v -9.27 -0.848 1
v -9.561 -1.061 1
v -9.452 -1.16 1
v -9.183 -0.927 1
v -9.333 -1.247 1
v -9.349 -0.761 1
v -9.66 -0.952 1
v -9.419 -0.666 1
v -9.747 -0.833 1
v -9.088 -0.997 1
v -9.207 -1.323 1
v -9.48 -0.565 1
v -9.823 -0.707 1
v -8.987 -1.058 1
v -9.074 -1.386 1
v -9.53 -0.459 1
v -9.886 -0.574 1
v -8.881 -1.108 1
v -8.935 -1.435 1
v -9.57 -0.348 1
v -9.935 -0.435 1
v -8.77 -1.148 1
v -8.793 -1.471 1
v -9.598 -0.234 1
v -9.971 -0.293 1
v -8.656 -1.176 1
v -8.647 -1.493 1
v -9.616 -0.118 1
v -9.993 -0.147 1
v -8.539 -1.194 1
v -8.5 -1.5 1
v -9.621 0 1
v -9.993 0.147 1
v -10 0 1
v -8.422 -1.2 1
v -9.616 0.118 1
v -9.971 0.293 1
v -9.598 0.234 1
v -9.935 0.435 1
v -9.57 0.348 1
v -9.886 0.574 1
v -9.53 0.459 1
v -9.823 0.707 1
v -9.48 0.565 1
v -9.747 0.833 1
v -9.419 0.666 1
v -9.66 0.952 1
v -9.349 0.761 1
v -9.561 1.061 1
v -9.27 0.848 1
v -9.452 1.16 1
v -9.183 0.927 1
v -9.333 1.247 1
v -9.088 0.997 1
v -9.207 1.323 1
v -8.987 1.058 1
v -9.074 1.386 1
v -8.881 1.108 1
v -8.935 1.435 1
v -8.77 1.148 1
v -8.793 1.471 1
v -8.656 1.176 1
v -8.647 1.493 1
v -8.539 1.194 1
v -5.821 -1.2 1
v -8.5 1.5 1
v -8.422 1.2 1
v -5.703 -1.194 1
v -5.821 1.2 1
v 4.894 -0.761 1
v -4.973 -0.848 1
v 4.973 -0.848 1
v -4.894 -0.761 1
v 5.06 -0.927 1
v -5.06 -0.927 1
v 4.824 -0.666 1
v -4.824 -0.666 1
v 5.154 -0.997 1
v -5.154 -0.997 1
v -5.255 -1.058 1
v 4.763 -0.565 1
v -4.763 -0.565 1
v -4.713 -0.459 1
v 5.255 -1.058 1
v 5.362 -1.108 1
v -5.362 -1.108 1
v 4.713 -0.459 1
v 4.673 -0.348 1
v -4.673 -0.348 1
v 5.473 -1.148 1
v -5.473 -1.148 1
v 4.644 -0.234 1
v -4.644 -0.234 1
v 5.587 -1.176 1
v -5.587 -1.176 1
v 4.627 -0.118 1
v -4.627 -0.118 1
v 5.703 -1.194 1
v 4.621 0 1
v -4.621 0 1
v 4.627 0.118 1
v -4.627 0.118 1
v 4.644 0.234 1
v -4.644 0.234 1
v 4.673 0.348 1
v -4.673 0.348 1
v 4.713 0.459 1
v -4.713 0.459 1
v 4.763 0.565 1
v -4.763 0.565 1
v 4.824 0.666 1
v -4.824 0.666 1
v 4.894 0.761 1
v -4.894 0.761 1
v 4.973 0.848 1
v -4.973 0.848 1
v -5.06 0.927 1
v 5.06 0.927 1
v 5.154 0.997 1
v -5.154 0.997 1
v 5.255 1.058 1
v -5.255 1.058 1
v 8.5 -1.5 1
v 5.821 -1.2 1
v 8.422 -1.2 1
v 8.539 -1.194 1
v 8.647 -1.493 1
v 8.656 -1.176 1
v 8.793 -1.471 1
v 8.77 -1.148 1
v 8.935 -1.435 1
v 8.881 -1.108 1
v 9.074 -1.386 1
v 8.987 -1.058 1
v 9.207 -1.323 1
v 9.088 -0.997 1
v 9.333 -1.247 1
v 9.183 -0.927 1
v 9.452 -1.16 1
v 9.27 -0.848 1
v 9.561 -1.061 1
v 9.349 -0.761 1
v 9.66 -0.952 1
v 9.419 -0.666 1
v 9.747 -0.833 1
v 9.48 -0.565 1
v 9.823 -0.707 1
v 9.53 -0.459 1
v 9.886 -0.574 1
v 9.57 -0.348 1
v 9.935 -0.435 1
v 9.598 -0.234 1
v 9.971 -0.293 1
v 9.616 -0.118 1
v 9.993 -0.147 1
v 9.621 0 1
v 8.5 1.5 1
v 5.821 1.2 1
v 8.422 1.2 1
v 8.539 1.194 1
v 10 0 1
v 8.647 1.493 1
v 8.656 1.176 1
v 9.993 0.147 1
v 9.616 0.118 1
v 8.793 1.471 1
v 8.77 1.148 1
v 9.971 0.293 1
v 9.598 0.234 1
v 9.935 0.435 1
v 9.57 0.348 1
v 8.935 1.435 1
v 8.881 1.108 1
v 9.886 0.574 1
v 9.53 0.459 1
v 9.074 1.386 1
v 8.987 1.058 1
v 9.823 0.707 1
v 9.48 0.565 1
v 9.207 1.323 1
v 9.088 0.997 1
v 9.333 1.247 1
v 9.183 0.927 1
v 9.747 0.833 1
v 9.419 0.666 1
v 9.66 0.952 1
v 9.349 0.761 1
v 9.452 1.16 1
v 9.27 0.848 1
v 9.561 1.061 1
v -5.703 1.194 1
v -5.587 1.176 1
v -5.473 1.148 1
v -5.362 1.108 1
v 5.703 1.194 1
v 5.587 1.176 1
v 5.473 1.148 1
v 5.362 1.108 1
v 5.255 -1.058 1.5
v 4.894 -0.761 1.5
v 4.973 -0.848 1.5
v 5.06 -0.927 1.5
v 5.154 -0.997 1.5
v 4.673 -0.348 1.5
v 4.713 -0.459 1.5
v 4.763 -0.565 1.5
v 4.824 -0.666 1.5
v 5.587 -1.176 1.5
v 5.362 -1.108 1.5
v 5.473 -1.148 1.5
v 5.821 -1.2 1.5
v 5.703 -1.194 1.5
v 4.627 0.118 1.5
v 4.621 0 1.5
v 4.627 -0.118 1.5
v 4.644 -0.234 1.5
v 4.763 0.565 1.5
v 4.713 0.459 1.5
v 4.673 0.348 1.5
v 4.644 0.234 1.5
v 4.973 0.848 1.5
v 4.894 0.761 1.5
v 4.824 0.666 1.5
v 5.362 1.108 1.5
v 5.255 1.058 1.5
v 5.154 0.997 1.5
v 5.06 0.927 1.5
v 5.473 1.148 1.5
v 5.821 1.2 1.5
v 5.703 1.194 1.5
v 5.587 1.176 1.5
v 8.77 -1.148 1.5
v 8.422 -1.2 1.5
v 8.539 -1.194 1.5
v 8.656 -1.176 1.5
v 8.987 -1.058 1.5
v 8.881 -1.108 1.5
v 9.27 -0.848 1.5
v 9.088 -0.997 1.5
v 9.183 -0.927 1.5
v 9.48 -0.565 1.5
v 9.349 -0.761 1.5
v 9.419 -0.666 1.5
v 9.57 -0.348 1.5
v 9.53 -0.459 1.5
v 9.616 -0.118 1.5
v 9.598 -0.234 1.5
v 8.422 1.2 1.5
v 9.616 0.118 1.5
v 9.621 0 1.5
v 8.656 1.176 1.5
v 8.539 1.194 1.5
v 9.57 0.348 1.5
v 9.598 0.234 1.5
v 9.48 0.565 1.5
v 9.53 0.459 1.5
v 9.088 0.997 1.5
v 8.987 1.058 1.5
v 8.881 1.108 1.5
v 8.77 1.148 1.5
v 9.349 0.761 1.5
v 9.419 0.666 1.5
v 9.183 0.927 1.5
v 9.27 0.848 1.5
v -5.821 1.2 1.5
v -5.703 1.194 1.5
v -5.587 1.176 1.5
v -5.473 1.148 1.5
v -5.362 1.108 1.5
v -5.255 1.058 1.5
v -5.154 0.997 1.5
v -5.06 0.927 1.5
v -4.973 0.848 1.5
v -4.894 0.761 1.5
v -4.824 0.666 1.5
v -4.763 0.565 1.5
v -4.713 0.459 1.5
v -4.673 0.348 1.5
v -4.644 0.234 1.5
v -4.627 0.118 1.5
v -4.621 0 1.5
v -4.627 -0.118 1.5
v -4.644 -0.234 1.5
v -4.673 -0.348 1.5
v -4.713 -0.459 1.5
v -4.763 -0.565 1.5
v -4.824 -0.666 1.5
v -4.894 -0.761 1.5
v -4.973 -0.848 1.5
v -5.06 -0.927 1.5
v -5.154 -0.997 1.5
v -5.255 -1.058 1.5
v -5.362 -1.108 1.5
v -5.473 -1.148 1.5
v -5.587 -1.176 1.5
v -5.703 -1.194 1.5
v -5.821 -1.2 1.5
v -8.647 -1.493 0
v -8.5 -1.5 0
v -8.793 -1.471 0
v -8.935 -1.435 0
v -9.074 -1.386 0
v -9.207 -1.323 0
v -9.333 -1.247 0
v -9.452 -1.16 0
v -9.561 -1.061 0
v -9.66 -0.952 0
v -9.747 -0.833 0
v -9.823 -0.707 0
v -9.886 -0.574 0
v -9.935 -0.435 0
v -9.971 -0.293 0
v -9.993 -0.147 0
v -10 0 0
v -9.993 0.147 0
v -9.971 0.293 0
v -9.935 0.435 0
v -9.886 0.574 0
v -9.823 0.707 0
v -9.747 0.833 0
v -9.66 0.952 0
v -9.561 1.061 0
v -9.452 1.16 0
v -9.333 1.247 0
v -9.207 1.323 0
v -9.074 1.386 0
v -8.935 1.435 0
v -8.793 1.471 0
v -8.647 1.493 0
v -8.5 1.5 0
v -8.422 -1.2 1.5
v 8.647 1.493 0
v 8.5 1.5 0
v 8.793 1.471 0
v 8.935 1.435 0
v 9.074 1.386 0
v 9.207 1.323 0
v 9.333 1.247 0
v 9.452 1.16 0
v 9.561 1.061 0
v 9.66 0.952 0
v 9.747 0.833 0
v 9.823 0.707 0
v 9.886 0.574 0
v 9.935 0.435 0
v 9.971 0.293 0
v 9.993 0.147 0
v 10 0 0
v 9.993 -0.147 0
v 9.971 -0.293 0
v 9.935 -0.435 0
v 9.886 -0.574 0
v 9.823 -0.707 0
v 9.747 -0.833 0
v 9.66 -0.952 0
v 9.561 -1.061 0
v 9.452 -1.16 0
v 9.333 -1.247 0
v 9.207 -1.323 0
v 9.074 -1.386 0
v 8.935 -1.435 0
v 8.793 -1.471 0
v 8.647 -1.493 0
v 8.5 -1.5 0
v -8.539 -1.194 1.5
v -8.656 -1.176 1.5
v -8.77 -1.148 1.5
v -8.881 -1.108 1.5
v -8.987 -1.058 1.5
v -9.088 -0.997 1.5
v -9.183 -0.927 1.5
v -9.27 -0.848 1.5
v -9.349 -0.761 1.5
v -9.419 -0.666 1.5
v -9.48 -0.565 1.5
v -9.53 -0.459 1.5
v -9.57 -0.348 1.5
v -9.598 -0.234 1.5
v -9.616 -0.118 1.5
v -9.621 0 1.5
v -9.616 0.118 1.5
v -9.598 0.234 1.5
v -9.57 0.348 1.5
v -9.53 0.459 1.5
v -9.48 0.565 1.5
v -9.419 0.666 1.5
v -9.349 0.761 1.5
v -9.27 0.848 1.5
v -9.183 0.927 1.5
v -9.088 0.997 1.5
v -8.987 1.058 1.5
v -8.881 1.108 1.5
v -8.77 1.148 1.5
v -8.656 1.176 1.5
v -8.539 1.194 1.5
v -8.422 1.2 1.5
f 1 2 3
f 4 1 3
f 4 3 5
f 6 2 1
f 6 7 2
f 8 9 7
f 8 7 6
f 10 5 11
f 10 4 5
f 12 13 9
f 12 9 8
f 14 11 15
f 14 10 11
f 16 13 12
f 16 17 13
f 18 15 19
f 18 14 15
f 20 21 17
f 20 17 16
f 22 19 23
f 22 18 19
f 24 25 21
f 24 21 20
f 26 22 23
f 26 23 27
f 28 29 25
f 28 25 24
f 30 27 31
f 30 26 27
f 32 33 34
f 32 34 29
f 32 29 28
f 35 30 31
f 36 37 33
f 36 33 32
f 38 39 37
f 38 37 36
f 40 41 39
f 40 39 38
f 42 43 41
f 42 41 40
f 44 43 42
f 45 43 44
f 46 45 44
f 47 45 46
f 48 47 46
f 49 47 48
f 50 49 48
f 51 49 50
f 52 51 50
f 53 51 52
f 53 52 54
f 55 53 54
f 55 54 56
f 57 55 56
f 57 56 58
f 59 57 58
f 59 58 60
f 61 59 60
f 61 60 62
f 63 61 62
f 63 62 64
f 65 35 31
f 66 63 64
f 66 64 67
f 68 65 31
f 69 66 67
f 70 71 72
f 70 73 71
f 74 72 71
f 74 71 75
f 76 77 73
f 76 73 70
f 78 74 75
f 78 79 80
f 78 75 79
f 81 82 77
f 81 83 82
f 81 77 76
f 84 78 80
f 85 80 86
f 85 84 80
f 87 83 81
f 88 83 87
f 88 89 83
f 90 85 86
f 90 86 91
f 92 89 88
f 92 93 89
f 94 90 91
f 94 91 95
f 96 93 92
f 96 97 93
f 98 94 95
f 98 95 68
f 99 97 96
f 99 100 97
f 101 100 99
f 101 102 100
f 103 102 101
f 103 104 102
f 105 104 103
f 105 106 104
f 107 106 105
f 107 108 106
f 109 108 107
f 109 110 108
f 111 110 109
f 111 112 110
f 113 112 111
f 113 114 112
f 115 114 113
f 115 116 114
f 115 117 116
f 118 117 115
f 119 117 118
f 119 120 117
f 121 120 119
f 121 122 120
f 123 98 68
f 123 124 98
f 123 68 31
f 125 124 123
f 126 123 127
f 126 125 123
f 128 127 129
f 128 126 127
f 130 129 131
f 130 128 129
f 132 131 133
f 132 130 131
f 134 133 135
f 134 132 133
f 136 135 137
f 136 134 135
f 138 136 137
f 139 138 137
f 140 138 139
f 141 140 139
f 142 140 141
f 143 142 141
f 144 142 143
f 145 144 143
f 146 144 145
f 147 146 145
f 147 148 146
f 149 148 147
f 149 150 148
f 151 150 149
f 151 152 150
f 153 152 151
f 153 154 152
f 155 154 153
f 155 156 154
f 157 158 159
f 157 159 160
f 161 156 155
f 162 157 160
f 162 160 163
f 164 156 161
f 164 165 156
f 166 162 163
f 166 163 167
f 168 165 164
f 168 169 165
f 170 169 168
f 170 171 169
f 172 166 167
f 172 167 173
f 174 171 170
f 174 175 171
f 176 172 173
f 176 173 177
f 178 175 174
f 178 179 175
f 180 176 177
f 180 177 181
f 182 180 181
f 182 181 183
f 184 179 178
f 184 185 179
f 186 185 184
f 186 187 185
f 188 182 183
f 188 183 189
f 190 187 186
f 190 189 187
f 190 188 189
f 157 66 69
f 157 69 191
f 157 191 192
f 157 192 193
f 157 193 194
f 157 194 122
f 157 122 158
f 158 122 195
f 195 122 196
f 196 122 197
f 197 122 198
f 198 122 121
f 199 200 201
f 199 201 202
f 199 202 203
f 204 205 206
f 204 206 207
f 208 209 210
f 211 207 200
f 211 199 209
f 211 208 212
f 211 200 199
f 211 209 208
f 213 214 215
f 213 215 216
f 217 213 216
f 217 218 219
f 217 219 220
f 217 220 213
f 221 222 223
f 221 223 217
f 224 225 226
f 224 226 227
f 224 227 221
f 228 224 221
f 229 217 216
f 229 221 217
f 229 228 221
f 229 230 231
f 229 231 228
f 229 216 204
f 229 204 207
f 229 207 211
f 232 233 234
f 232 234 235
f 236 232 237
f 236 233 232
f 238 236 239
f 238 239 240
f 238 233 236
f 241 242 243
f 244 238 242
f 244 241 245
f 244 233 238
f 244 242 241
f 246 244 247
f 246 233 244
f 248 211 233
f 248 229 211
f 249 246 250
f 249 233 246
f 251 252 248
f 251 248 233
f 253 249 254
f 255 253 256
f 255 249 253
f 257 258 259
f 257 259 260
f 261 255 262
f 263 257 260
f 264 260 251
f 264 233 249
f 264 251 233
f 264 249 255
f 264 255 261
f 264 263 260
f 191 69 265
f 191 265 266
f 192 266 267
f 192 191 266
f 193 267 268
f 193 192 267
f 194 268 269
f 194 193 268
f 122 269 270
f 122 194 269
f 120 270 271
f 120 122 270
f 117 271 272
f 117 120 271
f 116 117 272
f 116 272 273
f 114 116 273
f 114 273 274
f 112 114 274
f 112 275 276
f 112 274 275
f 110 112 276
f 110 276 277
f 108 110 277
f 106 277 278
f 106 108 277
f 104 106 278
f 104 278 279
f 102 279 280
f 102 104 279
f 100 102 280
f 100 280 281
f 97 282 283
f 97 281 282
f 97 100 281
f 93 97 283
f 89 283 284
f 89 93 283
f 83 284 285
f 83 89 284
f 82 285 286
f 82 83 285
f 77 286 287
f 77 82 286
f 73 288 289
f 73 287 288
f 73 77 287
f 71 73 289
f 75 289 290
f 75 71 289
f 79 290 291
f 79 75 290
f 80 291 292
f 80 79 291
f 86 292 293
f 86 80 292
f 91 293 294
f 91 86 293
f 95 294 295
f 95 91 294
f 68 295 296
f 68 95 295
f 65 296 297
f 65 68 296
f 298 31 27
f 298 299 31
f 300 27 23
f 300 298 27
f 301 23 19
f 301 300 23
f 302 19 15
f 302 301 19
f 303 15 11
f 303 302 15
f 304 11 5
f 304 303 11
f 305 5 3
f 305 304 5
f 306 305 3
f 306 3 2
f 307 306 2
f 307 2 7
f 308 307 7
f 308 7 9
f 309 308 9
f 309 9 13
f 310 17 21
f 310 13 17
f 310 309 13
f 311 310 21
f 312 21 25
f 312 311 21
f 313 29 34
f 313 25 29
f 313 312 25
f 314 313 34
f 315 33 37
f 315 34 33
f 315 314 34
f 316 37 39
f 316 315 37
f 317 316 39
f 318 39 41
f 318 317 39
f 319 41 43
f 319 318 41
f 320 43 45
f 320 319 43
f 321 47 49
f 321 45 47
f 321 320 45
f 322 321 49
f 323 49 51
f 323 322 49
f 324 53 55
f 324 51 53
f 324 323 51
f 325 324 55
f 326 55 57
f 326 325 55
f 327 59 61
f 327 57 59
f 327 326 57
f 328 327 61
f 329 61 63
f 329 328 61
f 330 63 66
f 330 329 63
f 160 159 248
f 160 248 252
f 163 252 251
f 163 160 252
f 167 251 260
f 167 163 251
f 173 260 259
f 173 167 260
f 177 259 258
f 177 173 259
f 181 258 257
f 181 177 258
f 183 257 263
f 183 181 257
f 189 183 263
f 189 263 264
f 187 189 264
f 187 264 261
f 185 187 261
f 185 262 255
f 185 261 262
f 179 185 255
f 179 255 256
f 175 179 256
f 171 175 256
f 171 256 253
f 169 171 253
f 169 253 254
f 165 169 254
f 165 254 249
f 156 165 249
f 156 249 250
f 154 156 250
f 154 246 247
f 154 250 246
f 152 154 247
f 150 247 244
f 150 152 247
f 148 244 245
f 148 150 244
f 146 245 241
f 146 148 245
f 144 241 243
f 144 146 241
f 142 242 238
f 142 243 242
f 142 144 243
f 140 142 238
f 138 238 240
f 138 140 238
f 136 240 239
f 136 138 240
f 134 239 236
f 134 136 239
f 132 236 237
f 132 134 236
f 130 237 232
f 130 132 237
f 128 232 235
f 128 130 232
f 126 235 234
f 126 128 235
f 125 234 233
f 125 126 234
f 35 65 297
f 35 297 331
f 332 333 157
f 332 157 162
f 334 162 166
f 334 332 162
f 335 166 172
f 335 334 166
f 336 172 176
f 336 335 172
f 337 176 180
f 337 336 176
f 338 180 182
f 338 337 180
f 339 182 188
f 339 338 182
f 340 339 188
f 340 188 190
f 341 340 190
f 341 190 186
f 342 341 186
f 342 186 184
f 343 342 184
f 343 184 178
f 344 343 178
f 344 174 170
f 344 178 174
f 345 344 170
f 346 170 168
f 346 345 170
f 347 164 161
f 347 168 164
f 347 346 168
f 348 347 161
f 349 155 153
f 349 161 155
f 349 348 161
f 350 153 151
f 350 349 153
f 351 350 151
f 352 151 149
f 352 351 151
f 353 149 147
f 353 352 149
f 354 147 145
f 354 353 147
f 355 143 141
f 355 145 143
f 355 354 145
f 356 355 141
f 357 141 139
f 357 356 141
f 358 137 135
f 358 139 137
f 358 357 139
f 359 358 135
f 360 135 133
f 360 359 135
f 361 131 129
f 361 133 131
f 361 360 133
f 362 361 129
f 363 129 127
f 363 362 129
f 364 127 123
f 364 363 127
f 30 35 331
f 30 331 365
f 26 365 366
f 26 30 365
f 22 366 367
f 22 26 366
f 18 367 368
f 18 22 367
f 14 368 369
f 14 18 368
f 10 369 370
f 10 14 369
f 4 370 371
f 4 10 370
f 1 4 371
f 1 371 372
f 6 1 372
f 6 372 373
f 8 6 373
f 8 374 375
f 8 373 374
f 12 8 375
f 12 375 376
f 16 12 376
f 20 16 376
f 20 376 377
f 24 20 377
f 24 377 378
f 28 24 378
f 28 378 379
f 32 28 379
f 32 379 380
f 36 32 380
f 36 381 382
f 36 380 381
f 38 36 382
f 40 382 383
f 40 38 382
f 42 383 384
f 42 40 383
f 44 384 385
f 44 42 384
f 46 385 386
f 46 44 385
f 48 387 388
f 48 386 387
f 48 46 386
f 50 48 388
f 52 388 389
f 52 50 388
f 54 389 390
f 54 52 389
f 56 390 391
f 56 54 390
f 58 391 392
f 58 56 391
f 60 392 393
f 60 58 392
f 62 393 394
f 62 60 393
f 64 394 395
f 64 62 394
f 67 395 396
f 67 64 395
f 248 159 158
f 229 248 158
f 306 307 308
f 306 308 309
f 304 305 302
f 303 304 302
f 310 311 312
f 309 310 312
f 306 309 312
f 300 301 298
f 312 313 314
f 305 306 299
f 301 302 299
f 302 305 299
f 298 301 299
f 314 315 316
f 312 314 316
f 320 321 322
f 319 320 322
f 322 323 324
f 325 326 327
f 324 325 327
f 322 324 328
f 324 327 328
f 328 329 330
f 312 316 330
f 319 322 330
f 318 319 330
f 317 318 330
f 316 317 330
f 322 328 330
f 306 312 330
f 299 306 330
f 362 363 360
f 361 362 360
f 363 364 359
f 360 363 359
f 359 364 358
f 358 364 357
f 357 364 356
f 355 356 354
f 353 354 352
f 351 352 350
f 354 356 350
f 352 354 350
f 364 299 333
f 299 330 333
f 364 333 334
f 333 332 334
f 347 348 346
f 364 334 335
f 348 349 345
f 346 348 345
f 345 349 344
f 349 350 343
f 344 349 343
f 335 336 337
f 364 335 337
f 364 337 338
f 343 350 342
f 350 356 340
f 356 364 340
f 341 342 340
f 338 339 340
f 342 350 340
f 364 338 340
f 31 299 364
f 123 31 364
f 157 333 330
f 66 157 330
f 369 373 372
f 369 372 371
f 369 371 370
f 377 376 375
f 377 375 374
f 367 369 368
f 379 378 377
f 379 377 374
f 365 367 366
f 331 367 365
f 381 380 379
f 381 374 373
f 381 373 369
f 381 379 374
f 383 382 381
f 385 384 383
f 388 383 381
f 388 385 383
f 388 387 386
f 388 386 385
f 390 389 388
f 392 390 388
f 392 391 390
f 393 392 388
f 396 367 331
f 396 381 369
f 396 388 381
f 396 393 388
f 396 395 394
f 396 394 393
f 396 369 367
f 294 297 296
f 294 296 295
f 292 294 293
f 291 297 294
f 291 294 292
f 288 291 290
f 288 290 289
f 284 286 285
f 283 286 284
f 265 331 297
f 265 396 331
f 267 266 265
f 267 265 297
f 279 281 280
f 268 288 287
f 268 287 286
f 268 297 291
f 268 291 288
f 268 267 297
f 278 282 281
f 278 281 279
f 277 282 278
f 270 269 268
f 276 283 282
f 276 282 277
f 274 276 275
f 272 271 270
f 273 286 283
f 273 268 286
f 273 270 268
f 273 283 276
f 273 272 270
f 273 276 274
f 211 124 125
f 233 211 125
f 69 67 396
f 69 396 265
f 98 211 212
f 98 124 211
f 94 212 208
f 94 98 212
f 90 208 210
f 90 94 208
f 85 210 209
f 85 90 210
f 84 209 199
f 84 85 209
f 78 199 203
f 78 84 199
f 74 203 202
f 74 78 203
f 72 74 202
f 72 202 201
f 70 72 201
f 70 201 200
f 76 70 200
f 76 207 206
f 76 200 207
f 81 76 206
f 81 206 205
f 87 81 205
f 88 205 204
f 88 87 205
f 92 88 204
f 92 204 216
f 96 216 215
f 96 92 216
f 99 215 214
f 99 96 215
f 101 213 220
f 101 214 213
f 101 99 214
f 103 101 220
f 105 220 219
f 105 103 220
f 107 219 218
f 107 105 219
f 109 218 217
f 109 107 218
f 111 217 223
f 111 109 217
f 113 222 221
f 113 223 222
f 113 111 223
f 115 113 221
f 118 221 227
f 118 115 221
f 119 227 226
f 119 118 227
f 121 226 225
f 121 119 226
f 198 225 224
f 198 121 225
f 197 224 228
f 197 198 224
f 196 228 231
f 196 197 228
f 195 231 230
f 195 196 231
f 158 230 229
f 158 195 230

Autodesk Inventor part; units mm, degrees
ref_plane "YZ Plane" through (0, 0, 0) normal (1, 0, 0) x (0, 1, 0)
ref_plane "XZ Plane" through (0, 0, 0) normal (0, 1, 0) x (-1, 0, 0)
ref_plane "XY Plane" through (0, 0, 0) normal (0, 0, 1) x (1, 0, 0)
sketch "草图1" plane through (0, 0, 0) normal (0, 0, 1) x (1, 0, 0)
  line L0 (-8.5, 0) -> (8.5, 0) construction
  line L1 (-8.5, -1.5) -> (8.5, -1.5)
  line L2 (8.5, 1.5) -> (-8.5, 1.5)
  arc A0 (-8.5, 1.5) -> (-8.5, -1.5) centre (-8.5, 0) ccw
  arc A1 (8.5, -1.5) -> (8.5, 1.5) centre (8.5, 0) ccw
  line L3 (5.8209, 0) -> (8.4219, 0) construction
  line L4 (5.8209, -1.1995) -> (8.4219, -1.1995)
  line L5 (8.4219, 1.1995) -> (5.8209, 1.1995)
  arc A2 (5.8209, 1.1995) -> (5.8209, -1.1995) centre (5.8209, 0) ccw
  arc A3 (8.4219, -1.1995) -> (8.4219, 1.1995) centre (8.4219, 0) ccw
  line L6 (0, 2.5577) -> (0, -3.2218)
  line L7 (-5.8209, 0) -> (-8.4219, 0) construction
  line L8 (-5.8209, -1.1995) -> (-8.4219, -1.1995)
  line L9 (-8.4219, 1.1995) -> (-5.8209, 1.1995)
  arc A4 (-5.8209, -1.1995) -> (-5.8209, 1.1995) centre (-5.8209, 0) ccw
  arc A5 (-8.4219, 1.1995) -> (-8.4219, -1.1995) centre (-8.4219, 0) ccw
  point P0 (0, 0)
  point P1 (-10, 0)
  point P2 (10, 0)
  point P3 (7.1214, 0)
  point P4 (4.6214, 0)
  point P5 (9.6214, 0)
  point P6 (-7.1214, 0)
  point P7 (-4.6214, 0)
  point P8 (-9.6214, 0)
  dimension "d0" = 20
  dimension "d1" = 3
  dimension "d2" = 5
extrude "拉伸1" add sketch "草图1" along normal blind 1
extrude "拉伸2" add sketch "草图1" along normal blind 1.5 contours A2 L5 A3 L4 | L8 A5 L9 A4
properties part number "音量接口"
